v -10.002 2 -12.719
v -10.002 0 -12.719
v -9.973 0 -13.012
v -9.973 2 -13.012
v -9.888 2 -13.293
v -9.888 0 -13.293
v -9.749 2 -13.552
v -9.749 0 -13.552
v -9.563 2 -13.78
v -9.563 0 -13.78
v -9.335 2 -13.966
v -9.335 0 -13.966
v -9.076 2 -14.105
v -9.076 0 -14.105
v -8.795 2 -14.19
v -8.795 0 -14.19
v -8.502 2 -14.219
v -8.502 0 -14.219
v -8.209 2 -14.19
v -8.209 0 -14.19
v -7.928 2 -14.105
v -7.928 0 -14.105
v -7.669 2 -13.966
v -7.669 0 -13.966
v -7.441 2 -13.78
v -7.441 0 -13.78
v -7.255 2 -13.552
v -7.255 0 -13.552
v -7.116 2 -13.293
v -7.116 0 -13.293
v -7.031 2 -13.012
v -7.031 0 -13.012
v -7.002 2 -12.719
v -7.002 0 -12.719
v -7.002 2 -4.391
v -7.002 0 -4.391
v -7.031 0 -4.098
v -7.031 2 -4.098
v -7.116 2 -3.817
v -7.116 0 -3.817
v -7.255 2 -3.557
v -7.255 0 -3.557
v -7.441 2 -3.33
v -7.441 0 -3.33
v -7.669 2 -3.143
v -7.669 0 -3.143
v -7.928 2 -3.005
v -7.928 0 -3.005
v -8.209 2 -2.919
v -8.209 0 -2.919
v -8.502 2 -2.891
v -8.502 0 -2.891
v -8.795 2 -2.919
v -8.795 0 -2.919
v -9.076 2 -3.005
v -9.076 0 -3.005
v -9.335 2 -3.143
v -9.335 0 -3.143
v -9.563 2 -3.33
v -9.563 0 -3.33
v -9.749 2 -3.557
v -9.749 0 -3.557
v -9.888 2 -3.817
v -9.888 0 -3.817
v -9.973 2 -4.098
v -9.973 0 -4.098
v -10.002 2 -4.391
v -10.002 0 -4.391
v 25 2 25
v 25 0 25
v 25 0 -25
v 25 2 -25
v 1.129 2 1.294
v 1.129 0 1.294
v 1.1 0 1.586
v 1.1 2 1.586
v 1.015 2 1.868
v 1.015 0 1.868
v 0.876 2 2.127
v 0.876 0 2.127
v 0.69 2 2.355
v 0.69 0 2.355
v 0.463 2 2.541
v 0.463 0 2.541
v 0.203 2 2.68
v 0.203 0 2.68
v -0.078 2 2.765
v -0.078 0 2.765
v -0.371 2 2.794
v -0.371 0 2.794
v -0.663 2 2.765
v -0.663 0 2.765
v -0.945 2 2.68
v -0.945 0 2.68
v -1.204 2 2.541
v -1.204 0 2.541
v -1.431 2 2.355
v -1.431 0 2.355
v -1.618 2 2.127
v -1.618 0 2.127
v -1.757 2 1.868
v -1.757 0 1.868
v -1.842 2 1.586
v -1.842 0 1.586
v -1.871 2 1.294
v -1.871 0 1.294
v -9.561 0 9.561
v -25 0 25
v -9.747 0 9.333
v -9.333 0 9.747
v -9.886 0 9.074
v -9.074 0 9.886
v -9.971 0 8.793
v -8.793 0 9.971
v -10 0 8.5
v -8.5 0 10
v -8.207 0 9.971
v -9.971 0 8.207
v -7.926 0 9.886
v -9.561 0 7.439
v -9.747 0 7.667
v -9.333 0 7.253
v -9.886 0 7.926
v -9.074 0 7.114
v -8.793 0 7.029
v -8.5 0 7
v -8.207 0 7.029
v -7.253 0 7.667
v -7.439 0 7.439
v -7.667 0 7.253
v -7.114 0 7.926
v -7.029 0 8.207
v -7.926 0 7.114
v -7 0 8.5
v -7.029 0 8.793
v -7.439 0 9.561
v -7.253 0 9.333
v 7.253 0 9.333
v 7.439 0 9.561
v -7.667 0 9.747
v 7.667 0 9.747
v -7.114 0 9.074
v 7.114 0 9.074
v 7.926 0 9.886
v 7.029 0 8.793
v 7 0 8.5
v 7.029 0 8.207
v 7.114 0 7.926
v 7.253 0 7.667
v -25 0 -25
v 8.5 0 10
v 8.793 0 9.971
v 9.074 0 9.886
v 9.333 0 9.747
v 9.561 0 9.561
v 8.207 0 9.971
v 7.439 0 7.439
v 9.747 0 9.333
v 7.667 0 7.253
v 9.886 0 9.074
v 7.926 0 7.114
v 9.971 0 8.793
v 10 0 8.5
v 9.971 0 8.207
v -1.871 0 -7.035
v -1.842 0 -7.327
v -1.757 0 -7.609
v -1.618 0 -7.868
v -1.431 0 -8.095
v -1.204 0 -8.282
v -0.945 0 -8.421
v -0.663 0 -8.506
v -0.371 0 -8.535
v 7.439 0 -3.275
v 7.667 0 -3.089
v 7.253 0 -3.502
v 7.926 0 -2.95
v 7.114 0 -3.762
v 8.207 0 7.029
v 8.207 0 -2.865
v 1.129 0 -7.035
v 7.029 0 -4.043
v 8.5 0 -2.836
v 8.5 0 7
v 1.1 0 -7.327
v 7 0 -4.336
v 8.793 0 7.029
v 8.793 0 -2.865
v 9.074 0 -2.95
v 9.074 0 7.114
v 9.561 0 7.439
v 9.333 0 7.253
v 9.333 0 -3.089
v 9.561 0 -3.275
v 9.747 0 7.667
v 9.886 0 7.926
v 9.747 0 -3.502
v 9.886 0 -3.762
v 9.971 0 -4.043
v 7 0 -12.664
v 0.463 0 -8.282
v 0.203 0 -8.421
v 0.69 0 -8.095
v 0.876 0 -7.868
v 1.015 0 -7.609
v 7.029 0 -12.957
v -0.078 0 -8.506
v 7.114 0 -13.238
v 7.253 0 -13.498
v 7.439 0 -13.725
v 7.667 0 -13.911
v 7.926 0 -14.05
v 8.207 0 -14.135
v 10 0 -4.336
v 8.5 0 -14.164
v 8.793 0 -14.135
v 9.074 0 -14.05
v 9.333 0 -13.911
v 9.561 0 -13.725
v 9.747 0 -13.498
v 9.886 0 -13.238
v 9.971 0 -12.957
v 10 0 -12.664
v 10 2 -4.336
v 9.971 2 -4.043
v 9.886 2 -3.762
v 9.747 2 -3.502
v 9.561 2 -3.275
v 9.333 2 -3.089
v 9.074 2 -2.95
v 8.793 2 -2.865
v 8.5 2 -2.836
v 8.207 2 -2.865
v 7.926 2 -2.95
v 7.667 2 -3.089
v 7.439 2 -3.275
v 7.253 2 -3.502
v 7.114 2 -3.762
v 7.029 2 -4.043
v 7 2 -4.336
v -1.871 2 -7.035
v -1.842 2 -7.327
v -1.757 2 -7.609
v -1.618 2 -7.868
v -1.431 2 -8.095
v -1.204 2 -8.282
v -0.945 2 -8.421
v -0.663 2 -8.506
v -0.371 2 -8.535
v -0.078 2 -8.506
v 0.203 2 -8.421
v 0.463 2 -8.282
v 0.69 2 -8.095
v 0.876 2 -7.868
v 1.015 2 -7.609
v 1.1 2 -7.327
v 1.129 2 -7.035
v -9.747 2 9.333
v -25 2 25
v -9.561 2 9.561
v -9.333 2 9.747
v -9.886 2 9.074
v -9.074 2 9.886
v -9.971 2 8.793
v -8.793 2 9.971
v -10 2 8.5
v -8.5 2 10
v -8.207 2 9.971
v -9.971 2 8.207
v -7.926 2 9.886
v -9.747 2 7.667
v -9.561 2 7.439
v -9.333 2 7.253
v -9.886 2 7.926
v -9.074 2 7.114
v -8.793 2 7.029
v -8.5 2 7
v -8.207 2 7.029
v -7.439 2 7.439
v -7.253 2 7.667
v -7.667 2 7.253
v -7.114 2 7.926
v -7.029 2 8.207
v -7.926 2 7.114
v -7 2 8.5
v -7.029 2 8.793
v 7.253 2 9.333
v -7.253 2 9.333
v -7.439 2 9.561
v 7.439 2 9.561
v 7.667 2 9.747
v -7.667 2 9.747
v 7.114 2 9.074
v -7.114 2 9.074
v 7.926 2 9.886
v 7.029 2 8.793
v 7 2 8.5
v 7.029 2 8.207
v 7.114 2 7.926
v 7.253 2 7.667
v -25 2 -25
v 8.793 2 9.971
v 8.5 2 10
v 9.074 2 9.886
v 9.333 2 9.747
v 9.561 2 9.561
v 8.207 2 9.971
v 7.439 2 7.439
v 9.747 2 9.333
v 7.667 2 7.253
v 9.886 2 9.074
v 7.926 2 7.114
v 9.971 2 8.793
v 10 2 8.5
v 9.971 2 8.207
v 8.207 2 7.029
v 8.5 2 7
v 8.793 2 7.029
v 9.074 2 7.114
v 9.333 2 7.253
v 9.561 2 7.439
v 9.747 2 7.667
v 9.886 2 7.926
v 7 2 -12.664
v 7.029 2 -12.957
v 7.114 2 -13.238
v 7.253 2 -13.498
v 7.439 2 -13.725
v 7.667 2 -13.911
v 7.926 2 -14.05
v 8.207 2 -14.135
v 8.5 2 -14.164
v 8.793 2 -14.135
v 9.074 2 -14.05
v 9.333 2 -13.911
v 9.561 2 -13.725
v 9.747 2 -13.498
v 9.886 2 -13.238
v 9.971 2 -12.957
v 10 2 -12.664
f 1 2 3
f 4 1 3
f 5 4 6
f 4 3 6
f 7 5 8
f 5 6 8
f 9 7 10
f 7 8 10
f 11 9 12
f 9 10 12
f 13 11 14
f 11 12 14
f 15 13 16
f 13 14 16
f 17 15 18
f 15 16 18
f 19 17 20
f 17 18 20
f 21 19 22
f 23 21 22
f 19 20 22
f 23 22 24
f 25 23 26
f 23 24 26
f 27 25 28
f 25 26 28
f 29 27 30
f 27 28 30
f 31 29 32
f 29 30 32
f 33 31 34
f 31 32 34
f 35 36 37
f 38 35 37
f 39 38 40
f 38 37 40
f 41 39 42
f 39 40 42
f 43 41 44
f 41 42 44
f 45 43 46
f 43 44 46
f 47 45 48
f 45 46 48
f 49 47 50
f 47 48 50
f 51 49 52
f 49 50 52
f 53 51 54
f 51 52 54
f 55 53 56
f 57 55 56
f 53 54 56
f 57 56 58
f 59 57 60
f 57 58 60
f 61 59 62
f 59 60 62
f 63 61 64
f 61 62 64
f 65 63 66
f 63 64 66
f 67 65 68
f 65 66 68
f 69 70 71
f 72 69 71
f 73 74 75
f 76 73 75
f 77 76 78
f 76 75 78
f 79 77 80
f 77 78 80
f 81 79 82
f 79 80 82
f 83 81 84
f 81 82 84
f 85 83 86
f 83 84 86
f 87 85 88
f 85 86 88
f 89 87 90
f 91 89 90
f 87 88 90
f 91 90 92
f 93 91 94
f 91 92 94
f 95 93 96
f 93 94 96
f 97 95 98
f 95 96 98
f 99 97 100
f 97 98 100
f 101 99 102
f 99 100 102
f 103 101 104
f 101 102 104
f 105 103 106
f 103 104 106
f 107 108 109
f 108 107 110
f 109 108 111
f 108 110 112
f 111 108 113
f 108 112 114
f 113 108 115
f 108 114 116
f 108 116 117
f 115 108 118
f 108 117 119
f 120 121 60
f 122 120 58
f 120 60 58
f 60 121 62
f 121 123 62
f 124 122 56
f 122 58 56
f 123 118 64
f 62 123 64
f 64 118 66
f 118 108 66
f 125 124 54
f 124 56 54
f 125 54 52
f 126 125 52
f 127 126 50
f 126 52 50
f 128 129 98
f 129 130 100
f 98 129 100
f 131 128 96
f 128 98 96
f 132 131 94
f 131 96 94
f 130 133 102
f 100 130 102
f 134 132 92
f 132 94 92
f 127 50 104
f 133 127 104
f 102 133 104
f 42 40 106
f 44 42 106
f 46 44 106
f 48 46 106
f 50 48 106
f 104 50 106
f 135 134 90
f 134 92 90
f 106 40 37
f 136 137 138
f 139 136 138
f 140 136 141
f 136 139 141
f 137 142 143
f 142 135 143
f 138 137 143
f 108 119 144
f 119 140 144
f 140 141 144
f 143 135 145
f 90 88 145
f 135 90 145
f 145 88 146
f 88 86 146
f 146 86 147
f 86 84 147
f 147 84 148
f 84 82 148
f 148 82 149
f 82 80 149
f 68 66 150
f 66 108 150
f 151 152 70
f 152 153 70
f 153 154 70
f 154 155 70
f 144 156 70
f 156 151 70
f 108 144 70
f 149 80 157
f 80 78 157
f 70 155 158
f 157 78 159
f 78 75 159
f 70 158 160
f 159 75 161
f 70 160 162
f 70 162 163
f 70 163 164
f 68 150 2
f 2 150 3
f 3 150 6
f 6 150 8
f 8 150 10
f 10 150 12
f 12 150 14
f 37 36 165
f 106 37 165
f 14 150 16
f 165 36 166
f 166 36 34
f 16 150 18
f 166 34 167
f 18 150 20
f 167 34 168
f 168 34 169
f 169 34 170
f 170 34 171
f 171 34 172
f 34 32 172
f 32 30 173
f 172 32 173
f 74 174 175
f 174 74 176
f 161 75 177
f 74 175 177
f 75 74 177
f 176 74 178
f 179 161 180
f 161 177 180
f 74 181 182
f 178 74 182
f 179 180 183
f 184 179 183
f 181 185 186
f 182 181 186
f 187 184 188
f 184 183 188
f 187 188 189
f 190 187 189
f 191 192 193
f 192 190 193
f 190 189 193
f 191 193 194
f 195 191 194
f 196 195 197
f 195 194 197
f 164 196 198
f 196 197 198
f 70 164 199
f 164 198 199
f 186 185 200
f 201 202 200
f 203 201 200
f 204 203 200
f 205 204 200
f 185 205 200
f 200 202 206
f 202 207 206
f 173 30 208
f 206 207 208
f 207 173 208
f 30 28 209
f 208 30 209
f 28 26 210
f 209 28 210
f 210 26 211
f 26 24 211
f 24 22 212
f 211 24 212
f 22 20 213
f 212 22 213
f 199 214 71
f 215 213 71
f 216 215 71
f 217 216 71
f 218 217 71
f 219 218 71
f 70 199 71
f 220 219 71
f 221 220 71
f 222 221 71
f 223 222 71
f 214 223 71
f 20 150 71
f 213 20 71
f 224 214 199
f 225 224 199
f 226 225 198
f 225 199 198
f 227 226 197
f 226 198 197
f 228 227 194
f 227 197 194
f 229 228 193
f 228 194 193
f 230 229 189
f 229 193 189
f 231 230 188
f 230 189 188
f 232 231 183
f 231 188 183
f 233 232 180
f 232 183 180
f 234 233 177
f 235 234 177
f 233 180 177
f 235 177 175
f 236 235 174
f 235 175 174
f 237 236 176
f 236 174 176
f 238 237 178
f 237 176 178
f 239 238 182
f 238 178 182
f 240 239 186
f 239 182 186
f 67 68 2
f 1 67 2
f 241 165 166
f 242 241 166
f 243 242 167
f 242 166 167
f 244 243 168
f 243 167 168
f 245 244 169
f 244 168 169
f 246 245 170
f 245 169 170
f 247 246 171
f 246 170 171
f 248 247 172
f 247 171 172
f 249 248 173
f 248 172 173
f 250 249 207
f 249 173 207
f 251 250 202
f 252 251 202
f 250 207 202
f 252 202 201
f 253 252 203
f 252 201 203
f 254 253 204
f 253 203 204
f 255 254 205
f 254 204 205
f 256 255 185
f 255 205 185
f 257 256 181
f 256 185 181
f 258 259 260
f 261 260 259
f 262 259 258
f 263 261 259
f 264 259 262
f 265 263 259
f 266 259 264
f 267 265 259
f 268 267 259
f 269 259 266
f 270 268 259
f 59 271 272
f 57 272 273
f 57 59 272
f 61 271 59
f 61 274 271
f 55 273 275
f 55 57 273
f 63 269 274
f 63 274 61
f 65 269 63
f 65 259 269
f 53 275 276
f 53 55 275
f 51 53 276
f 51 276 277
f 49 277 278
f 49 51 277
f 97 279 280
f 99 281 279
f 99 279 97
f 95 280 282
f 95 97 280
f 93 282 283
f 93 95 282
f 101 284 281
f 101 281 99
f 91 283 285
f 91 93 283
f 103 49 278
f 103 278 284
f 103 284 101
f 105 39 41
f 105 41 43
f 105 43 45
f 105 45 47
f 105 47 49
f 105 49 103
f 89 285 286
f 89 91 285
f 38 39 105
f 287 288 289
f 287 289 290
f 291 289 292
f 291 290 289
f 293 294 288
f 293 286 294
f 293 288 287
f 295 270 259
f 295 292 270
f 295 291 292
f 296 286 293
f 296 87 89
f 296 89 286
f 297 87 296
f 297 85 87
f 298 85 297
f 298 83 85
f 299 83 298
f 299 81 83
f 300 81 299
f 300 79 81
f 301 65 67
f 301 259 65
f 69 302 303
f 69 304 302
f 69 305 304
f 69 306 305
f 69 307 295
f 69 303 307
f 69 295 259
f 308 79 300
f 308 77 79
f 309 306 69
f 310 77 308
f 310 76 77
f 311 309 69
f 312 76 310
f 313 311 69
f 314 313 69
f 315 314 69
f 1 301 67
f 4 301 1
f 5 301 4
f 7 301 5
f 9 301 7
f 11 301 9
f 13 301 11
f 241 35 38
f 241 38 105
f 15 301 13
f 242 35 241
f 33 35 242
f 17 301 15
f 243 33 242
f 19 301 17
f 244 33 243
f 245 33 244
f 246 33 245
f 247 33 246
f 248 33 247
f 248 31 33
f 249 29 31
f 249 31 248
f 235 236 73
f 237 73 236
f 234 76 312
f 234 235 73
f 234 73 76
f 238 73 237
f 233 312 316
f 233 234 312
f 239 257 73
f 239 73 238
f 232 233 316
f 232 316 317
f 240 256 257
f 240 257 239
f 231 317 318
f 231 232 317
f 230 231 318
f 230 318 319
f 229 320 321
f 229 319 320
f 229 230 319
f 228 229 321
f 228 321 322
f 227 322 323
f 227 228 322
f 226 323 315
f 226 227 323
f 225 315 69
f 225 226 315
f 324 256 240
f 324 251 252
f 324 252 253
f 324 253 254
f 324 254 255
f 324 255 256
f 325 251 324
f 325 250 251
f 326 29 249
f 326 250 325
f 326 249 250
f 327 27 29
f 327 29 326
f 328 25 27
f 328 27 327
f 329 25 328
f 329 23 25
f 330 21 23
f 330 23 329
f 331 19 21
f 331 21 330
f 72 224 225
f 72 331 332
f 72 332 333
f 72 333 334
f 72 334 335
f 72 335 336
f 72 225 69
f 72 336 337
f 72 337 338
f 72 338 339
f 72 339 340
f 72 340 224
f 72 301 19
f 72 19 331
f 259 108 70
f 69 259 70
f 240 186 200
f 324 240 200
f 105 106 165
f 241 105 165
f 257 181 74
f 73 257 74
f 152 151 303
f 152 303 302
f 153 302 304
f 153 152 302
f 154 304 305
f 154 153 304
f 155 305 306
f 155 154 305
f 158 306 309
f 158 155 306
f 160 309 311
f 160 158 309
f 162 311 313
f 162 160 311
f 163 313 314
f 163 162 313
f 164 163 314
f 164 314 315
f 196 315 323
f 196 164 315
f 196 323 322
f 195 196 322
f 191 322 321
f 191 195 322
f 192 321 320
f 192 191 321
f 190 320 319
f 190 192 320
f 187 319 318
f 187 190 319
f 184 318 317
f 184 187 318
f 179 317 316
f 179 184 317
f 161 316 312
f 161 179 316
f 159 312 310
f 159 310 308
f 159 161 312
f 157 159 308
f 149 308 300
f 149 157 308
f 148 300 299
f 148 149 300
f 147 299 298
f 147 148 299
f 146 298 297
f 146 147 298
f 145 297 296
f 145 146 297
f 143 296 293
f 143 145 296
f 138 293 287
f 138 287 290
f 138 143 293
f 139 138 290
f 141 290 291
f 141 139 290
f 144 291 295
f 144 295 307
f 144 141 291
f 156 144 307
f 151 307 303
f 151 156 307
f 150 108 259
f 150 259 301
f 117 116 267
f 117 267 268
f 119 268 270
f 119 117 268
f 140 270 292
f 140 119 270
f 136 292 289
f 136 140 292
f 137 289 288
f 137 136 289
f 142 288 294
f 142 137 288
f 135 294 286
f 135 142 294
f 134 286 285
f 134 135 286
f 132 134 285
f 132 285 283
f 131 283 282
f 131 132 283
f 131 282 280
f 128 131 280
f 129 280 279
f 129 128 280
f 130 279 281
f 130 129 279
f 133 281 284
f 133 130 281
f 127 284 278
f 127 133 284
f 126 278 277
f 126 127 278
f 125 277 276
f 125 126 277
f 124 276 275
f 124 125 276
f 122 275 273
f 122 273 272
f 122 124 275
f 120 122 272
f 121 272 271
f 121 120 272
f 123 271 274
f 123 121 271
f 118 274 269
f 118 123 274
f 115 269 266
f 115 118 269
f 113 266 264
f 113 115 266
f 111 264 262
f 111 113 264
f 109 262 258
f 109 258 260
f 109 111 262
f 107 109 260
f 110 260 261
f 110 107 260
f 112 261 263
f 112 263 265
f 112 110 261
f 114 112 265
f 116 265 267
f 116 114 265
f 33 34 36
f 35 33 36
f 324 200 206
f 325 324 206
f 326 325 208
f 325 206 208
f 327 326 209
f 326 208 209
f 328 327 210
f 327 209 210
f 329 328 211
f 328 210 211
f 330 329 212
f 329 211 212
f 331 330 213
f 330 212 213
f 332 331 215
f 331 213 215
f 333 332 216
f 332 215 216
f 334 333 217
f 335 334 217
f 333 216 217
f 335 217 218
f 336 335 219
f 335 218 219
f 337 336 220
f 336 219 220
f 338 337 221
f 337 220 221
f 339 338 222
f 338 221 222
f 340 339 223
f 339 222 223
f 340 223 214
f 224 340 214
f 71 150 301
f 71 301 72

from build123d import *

# Parameters (mm, degrees)
SKETCH1_W           = 50
SKETCH1_H           = 50
SKETCH1_R           = 1.5
BOSS_EXTRUDE1_DEPTH = 2


with BuildPart() as part:
    # Sketch1 → Boss-Extrude1 (new body)
    with BuildSketch(Plane(origin=(0, 0, 0), x_dir=(1, 0, 0), z_dir=(0, 1, 0))):
        Rectangle(SKETCH1_W, SKETCH1_H)
        with Locations(Location((8.5, -8.5, 0), (0, 0, 270))):
            Circle(SKETCH1_R, mode=Mode.SUBTRACT)
        with Locations(Location((-8.5, -8.5, 0), (0, 0, 270))):
            Circle(SKETCH1_R, mode=Mode.SUBTRACT)
        with BuildLine():
            Line((-10.002005601, 4.390529846), (-10.002005601, 12.719094592))
            ThreePointArc((-10.002005601, 12.719094592), (-8.502005601, 14.219094592), (-7.002005601, 12.719094592))
            Line((-7.002005601, 12.719094592), (-7.002005601, 4.390529846))
            ThreePointArc((-7.002005601, 4.390529846), (-8.502005601, 2.890529846), (-10.002005601, 4.390529846))
        make_face(mode=Mode.SUBTRACT)
        with BuildLine():
            Line((7, 4.335717627), (7, 12.664282373))
            ThreePointArc((7, 12.664282373), (8.5, 14.164282373), (10, 12.664282373))
            Line((10, 12.664282373), (10, 4.335717627))
            ThreePointArc((10, 4.335717627), (8.5, 2.835717627), (7, 4.335717627))
        make_face(mode=Mode.SUBTRACT)
        with BuildLine():
            Line((-1.870832872, -1.293852114), (-1.870832872, 7.034712631))
            ThreePointArc((-1.870832872, 7.034712631), (-0.370832872, 8.534712631), (1.129167128, 7.034712631))
            Line((1.129167128, 7.034712631), (1.129167128, -1.293852114))
            ThreePointArc((1.129167128, -1.293852114), (-0.370832872, -2.793852114), (-1.870832872, -1.293852114))
        make_face(mode=Mode.SUBTRACT)
    extrude(amount=BOSS_EXTRUDE1_DEPTH)


solid = part.part
